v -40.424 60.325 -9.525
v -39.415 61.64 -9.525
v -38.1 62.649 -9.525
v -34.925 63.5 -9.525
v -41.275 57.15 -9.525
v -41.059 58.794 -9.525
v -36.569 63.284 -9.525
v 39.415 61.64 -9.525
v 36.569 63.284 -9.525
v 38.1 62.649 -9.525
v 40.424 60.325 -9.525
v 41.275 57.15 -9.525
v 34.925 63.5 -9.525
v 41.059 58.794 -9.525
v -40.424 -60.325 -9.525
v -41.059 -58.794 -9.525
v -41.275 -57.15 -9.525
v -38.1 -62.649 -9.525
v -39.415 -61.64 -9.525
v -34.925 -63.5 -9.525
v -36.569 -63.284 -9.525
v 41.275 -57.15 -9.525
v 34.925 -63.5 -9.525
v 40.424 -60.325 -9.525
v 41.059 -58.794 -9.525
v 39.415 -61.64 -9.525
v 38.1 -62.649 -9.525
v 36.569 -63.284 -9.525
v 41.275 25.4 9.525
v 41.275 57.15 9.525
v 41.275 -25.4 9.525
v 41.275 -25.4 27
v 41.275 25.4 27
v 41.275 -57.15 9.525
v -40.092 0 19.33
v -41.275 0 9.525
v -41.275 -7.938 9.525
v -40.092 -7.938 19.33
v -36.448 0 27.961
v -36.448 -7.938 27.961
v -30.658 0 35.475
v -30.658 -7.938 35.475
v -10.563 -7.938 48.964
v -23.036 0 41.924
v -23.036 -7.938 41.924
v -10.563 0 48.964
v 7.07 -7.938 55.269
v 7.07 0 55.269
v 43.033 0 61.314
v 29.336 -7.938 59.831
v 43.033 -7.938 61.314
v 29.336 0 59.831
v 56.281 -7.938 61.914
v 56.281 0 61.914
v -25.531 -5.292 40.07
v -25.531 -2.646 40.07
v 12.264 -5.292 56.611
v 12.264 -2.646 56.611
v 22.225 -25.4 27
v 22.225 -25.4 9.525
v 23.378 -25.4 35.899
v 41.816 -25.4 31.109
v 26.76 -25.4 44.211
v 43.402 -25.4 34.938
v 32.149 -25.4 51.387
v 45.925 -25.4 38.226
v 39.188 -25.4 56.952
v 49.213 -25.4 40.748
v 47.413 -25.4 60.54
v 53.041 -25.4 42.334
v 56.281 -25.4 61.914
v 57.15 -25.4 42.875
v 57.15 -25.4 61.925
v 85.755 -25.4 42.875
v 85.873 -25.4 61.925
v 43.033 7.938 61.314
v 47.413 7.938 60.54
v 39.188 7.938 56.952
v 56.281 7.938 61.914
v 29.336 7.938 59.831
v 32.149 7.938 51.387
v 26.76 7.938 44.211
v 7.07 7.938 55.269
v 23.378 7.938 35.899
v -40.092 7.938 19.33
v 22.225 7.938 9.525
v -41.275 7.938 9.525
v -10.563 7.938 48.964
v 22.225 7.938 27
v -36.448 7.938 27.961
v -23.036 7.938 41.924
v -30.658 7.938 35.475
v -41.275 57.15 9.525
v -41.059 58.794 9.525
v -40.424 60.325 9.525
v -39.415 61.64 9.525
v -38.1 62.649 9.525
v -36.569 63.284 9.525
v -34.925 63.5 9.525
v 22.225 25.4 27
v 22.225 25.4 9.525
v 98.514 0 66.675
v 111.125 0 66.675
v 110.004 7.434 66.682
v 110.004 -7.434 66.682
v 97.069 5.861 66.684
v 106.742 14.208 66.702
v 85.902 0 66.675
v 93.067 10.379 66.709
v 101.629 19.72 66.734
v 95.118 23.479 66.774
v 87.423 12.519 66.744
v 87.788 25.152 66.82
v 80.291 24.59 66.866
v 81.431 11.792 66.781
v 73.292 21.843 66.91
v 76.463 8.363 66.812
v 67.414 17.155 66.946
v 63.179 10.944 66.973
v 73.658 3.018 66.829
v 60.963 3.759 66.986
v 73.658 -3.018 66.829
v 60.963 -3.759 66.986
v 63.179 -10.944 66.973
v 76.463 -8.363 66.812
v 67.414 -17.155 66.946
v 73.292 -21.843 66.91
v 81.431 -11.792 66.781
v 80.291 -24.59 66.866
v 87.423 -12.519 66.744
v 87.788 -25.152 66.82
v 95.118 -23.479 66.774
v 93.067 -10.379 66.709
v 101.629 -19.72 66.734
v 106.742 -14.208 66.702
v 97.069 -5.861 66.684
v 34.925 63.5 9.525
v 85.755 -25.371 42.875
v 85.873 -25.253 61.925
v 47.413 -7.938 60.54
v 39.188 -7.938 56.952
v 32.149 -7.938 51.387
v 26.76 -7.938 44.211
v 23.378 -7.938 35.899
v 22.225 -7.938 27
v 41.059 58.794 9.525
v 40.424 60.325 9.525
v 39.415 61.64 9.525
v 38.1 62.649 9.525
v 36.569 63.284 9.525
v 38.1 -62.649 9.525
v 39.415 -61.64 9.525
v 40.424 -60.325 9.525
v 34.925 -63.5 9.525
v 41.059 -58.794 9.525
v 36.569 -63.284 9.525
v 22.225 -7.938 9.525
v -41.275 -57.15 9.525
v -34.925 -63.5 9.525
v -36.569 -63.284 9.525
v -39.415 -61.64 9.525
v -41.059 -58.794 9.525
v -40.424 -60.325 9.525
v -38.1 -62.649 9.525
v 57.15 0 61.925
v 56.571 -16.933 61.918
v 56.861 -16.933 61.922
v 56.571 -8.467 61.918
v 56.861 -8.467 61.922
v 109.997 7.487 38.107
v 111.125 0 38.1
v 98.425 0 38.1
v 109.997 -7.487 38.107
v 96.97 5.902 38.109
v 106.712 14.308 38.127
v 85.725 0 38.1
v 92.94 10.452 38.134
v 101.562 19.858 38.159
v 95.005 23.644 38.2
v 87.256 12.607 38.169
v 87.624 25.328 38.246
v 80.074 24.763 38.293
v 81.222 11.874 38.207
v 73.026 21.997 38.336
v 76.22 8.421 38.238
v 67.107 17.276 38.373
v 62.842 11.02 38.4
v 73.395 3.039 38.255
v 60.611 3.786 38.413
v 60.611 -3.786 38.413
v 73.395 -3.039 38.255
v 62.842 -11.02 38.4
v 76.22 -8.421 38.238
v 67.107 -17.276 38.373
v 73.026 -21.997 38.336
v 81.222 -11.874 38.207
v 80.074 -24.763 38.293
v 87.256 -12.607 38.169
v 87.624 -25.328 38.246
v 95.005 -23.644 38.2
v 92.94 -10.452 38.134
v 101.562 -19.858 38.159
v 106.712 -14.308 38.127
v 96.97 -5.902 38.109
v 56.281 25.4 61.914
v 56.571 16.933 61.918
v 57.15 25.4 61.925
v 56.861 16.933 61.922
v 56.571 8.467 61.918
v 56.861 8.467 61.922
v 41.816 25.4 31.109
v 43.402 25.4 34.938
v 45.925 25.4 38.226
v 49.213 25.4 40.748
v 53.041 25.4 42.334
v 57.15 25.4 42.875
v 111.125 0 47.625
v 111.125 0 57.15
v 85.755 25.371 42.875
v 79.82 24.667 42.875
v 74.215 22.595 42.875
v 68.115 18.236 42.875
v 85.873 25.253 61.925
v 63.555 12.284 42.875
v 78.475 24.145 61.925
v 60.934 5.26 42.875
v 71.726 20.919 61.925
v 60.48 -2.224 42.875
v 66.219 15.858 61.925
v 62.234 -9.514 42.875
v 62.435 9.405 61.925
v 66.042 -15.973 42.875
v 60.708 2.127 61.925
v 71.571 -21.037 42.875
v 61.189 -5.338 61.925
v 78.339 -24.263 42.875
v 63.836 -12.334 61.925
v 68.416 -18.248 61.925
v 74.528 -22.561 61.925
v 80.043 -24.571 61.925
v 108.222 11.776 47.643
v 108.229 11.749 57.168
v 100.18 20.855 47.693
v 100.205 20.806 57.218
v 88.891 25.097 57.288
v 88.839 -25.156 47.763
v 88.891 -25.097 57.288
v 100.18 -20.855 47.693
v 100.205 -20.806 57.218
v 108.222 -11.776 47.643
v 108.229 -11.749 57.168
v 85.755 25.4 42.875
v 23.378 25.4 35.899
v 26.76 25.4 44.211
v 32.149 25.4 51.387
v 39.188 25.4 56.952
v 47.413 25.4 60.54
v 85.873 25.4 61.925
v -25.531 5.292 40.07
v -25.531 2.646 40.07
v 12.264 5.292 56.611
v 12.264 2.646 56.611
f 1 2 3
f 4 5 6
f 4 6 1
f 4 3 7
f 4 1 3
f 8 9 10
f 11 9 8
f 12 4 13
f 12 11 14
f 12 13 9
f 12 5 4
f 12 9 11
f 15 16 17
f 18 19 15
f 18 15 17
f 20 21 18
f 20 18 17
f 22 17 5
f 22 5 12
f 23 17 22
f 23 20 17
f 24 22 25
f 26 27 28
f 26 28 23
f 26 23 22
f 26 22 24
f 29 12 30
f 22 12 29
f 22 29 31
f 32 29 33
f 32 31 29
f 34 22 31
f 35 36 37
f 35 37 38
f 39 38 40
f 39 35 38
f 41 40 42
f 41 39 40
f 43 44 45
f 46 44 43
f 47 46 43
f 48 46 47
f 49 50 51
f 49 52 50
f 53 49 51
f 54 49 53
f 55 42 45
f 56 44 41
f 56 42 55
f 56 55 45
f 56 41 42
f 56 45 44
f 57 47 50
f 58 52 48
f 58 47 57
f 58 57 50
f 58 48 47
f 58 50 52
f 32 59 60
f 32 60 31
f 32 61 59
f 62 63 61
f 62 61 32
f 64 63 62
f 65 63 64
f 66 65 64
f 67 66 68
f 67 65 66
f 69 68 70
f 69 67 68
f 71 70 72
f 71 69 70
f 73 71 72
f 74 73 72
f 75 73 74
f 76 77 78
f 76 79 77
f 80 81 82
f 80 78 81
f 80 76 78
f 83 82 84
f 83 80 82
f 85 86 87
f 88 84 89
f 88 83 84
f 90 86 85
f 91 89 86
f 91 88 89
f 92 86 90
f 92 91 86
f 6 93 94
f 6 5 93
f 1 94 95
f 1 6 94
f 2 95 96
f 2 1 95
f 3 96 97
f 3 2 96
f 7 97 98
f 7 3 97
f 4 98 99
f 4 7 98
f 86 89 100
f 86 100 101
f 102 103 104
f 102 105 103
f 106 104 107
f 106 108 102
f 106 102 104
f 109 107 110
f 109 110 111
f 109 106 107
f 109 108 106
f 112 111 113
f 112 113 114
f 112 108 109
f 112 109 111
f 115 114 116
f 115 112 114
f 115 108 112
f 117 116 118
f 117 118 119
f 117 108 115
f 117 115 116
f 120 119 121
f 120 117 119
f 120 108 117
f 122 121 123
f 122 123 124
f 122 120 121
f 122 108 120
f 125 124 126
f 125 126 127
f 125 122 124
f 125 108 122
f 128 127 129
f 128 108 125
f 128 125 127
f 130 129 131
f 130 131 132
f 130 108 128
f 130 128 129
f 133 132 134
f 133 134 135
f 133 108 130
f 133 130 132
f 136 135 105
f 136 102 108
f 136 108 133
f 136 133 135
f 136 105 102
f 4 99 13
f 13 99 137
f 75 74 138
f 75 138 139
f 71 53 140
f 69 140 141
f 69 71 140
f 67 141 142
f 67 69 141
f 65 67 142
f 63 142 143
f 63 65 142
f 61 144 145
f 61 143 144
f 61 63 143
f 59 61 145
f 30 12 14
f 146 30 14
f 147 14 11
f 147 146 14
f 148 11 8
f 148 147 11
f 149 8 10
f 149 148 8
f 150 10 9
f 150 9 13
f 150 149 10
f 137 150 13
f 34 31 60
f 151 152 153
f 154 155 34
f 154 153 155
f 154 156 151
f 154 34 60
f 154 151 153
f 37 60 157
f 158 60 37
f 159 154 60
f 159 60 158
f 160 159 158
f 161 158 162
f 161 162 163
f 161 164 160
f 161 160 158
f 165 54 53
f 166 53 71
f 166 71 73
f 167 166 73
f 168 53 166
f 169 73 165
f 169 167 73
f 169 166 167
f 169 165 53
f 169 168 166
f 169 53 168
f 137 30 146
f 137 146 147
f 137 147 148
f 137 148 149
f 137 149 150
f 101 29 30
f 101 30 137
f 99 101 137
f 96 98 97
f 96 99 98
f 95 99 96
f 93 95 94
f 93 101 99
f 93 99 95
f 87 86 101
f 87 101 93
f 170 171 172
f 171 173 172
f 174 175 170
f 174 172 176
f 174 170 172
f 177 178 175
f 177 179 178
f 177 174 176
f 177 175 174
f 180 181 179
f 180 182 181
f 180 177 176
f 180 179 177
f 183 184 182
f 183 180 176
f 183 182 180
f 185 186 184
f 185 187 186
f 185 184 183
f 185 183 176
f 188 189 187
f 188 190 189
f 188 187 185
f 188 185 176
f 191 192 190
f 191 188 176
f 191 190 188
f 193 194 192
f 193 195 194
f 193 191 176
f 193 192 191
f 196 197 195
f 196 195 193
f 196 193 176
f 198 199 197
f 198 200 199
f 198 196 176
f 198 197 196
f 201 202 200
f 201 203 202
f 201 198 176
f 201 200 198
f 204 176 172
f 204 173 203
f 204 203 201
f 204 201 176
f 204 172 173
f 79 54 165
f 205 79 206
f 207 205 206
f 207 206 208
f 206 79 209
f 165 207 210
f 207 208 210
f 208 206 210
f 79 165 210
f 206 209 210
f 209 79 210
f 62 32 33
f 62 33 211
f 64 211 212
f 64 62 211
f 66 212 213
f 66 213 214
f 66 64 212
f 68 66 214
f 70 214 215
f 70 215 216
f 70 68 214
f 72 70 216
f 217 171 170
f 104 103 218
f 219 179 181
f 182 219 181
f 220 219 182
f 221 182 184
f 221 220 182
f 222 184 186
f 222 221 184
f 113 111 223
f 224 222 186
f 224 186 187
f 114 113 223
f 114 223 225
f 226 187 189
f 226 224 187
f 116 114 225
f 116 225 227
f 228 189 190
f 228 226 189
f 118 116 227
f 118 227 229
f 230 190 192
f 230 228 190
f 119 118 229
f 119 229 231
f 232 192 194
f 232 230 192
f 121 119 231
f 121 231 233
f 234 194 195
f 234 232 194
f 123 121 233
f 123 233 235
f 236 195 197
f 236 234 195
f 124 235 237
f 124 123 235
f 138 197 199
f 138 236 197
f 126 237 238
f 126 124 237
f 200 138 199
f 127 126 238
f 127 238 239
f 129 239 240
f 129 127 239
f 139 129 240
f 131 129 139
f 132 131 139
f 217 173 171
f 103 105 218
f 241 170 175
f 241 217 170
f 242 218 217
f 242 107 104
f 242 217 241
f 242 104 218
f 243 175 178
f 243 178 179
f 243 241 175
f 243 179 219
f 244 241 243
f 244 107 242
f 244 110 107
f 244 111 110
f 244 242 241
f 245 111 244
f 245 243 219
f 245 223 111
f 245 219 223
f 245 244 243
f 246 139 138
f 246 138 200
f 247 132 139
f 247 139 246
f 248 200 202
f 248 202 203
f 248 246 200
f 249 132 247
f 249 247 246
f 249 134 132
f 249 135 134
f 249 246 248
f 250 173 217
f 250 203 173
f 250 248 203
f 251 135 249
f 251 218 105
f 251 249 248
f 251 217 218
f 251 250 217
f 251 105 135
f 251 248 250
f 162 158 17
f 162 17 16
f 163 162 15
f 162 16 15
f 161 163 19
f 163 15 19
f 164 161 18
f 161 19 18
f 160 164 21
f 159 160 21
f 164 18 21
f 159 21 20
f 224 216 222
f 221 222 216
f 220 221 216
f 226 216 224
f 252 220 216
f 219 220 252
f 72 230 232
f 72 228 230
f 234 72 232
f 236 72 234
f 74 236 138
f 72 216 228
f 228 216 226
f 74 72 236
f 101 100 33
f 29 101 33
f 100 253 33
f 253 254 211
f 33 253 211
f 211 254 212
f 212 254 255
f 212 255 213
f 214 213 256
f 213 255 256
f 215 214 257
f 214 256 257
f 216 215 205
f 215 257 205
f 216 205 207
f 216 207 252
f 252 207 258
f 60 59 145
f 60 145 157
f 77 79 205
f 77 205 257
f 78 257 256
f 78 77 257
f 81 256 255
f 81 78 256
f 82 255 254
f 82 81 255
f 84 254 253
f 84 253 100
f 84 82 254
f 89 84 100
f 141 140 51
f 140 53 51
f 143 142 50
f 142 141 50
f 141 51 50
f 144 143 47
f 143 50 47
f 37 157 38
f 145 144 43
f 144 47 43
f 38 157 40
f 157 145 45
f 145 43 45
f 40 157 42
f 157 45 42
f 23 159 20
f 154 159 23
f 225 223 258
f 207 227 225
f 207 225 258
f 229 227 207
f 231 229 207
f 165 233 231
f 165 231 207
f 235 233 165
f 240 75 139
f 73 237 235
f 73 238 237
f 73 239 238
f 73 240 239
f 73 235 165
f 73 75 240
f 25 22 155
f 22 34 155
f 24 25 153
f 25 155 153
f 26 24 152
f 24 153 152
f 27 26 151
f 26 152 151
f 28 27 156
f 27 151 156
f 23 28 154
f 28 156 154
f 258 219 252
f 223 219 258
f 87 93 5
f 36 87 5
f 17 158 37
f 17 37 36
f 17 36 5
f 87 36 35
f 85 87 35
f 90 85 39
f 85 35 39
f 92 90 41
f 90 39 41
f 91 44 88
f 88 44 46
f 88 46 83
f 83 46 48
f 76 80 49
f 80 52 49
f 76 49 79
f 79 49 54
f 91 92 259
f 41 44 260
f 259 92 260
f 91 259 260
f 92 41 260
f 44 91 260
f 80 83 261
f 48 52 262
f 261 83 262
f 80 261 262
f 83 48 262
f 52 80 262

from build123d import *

# Parameters (mm, degrees)
F1_DEPTH = 63.5
F2_DEPTH = 25.4
F3_DEPTH = 7.9375
F5_R     = 6.35


with BuildPart() as f1:
    # F0 (on Front) → F1 (new body, symmetric)
    with BuildSketch(Plane.XZ):
        Polygon((22.225, 9.525), (-41.275, 9.525), (-41.275, -9.525), (41.275, -9.525), (41.275, 9.525), align=None)
    extrude(amount=F1_DEPTH, both=True)

    # F0 (on Front) → F2 (join, symmetric)
    with BuildSketch(Plane.XZ):
        with BuildLine():
            Line((22.225, 27.0002), (22.225, 9.525))
            Line((22.225, 9.525), (41.275, 9.525))
            Line((41.275, 9.525), (41.275, 27.0002))
            ThreePointArc((41.275, 27.0002), (45.9246798487, 38.2255201513), (57.15, 42.8752))
            Line((57.15, 42.8752), (60.325, 42.8752))
            Line((60.325, 42.8752), (60.325, 61.9252))
            Line((60.325, 61.9252), (57.15, 61.9252))
            add(Edge.make_bspline(
                [(56.2807505005, 61.9143809342), (56.5712025295, 61.918597831), (56.8609603005, 61.9222027986), (57.15, 61.9252)],
                knots=[110.7360058155, 110.7360058155, 110.7360058155, 110.7360058155, 111.5045361635, 111.5045361635, 111.5045361635, 111.5045361635], degree=3))
            ThreePointArc((56.2807505005, 61.9143809342), (32.1488583884, 51.3866417887), (22.225, 27.0002))
        make_face()
        Polygon((85.8728378947, 61.9252), (60.325, 61.9252), (60.325, 42.8752), (85.7546306228, 42.8752), align=None)
    extrude(amount=F2_DEPTH, both=True)

    # F0 (on Front) → F3 (join, symmetric)
    with BuildSketch(Plane.XZ):
        with BuildLine():
            add(Edge.make_bspline(
                [(-41.275, 9.525), (-41.8342912286, 47.9946959392), (14.430096654, 61.3067766904), (56.2807505005, 61.9143809342)],
                knots=[0, 0, 0, 0, 110.7360058155, 110.7360058155, 110.7360058155, 110.7360058155], degree=3))
            Line((-41.275, 9.525), (22.225, 9.525))
            Line((22.225, 9.525), (22.225, 27.0002))
            ThreePointArc((22.225, 27.0002), (32.1488583884, 51.3866417887), (56.2807505005, 61.9143809342))
        make_face()
    extrude(amount=F3_DEPTH, both=True)

    # F0 (on Front) → F4 (revolve)
    with BuildSketch(Plane.XZ):
        Polygon((85.9023109078, 66.675), (85.8728378947, 61.9252), (85.7546306228, 42.8752), (85.725, 38.1), (111.125, 38.1), (111.125, 66.675), align=None)
    revolve(axis=Axis((85.8136554539, 0, 52.3875), (0.0062049867, 0, 0.9999807489)))

    # F5
    f5_edges = [f1.edges().sort_by_distance(p)[0] for p in [
        (41.275, -63.5, 0),
        (41.275, 63.5, 0),
        (-41.275, 63.5, 0),
        (-41.275, -63.5, 0),
    ]]
    fillet(f5_edges, radius=F5_R)


solid = f1.part
